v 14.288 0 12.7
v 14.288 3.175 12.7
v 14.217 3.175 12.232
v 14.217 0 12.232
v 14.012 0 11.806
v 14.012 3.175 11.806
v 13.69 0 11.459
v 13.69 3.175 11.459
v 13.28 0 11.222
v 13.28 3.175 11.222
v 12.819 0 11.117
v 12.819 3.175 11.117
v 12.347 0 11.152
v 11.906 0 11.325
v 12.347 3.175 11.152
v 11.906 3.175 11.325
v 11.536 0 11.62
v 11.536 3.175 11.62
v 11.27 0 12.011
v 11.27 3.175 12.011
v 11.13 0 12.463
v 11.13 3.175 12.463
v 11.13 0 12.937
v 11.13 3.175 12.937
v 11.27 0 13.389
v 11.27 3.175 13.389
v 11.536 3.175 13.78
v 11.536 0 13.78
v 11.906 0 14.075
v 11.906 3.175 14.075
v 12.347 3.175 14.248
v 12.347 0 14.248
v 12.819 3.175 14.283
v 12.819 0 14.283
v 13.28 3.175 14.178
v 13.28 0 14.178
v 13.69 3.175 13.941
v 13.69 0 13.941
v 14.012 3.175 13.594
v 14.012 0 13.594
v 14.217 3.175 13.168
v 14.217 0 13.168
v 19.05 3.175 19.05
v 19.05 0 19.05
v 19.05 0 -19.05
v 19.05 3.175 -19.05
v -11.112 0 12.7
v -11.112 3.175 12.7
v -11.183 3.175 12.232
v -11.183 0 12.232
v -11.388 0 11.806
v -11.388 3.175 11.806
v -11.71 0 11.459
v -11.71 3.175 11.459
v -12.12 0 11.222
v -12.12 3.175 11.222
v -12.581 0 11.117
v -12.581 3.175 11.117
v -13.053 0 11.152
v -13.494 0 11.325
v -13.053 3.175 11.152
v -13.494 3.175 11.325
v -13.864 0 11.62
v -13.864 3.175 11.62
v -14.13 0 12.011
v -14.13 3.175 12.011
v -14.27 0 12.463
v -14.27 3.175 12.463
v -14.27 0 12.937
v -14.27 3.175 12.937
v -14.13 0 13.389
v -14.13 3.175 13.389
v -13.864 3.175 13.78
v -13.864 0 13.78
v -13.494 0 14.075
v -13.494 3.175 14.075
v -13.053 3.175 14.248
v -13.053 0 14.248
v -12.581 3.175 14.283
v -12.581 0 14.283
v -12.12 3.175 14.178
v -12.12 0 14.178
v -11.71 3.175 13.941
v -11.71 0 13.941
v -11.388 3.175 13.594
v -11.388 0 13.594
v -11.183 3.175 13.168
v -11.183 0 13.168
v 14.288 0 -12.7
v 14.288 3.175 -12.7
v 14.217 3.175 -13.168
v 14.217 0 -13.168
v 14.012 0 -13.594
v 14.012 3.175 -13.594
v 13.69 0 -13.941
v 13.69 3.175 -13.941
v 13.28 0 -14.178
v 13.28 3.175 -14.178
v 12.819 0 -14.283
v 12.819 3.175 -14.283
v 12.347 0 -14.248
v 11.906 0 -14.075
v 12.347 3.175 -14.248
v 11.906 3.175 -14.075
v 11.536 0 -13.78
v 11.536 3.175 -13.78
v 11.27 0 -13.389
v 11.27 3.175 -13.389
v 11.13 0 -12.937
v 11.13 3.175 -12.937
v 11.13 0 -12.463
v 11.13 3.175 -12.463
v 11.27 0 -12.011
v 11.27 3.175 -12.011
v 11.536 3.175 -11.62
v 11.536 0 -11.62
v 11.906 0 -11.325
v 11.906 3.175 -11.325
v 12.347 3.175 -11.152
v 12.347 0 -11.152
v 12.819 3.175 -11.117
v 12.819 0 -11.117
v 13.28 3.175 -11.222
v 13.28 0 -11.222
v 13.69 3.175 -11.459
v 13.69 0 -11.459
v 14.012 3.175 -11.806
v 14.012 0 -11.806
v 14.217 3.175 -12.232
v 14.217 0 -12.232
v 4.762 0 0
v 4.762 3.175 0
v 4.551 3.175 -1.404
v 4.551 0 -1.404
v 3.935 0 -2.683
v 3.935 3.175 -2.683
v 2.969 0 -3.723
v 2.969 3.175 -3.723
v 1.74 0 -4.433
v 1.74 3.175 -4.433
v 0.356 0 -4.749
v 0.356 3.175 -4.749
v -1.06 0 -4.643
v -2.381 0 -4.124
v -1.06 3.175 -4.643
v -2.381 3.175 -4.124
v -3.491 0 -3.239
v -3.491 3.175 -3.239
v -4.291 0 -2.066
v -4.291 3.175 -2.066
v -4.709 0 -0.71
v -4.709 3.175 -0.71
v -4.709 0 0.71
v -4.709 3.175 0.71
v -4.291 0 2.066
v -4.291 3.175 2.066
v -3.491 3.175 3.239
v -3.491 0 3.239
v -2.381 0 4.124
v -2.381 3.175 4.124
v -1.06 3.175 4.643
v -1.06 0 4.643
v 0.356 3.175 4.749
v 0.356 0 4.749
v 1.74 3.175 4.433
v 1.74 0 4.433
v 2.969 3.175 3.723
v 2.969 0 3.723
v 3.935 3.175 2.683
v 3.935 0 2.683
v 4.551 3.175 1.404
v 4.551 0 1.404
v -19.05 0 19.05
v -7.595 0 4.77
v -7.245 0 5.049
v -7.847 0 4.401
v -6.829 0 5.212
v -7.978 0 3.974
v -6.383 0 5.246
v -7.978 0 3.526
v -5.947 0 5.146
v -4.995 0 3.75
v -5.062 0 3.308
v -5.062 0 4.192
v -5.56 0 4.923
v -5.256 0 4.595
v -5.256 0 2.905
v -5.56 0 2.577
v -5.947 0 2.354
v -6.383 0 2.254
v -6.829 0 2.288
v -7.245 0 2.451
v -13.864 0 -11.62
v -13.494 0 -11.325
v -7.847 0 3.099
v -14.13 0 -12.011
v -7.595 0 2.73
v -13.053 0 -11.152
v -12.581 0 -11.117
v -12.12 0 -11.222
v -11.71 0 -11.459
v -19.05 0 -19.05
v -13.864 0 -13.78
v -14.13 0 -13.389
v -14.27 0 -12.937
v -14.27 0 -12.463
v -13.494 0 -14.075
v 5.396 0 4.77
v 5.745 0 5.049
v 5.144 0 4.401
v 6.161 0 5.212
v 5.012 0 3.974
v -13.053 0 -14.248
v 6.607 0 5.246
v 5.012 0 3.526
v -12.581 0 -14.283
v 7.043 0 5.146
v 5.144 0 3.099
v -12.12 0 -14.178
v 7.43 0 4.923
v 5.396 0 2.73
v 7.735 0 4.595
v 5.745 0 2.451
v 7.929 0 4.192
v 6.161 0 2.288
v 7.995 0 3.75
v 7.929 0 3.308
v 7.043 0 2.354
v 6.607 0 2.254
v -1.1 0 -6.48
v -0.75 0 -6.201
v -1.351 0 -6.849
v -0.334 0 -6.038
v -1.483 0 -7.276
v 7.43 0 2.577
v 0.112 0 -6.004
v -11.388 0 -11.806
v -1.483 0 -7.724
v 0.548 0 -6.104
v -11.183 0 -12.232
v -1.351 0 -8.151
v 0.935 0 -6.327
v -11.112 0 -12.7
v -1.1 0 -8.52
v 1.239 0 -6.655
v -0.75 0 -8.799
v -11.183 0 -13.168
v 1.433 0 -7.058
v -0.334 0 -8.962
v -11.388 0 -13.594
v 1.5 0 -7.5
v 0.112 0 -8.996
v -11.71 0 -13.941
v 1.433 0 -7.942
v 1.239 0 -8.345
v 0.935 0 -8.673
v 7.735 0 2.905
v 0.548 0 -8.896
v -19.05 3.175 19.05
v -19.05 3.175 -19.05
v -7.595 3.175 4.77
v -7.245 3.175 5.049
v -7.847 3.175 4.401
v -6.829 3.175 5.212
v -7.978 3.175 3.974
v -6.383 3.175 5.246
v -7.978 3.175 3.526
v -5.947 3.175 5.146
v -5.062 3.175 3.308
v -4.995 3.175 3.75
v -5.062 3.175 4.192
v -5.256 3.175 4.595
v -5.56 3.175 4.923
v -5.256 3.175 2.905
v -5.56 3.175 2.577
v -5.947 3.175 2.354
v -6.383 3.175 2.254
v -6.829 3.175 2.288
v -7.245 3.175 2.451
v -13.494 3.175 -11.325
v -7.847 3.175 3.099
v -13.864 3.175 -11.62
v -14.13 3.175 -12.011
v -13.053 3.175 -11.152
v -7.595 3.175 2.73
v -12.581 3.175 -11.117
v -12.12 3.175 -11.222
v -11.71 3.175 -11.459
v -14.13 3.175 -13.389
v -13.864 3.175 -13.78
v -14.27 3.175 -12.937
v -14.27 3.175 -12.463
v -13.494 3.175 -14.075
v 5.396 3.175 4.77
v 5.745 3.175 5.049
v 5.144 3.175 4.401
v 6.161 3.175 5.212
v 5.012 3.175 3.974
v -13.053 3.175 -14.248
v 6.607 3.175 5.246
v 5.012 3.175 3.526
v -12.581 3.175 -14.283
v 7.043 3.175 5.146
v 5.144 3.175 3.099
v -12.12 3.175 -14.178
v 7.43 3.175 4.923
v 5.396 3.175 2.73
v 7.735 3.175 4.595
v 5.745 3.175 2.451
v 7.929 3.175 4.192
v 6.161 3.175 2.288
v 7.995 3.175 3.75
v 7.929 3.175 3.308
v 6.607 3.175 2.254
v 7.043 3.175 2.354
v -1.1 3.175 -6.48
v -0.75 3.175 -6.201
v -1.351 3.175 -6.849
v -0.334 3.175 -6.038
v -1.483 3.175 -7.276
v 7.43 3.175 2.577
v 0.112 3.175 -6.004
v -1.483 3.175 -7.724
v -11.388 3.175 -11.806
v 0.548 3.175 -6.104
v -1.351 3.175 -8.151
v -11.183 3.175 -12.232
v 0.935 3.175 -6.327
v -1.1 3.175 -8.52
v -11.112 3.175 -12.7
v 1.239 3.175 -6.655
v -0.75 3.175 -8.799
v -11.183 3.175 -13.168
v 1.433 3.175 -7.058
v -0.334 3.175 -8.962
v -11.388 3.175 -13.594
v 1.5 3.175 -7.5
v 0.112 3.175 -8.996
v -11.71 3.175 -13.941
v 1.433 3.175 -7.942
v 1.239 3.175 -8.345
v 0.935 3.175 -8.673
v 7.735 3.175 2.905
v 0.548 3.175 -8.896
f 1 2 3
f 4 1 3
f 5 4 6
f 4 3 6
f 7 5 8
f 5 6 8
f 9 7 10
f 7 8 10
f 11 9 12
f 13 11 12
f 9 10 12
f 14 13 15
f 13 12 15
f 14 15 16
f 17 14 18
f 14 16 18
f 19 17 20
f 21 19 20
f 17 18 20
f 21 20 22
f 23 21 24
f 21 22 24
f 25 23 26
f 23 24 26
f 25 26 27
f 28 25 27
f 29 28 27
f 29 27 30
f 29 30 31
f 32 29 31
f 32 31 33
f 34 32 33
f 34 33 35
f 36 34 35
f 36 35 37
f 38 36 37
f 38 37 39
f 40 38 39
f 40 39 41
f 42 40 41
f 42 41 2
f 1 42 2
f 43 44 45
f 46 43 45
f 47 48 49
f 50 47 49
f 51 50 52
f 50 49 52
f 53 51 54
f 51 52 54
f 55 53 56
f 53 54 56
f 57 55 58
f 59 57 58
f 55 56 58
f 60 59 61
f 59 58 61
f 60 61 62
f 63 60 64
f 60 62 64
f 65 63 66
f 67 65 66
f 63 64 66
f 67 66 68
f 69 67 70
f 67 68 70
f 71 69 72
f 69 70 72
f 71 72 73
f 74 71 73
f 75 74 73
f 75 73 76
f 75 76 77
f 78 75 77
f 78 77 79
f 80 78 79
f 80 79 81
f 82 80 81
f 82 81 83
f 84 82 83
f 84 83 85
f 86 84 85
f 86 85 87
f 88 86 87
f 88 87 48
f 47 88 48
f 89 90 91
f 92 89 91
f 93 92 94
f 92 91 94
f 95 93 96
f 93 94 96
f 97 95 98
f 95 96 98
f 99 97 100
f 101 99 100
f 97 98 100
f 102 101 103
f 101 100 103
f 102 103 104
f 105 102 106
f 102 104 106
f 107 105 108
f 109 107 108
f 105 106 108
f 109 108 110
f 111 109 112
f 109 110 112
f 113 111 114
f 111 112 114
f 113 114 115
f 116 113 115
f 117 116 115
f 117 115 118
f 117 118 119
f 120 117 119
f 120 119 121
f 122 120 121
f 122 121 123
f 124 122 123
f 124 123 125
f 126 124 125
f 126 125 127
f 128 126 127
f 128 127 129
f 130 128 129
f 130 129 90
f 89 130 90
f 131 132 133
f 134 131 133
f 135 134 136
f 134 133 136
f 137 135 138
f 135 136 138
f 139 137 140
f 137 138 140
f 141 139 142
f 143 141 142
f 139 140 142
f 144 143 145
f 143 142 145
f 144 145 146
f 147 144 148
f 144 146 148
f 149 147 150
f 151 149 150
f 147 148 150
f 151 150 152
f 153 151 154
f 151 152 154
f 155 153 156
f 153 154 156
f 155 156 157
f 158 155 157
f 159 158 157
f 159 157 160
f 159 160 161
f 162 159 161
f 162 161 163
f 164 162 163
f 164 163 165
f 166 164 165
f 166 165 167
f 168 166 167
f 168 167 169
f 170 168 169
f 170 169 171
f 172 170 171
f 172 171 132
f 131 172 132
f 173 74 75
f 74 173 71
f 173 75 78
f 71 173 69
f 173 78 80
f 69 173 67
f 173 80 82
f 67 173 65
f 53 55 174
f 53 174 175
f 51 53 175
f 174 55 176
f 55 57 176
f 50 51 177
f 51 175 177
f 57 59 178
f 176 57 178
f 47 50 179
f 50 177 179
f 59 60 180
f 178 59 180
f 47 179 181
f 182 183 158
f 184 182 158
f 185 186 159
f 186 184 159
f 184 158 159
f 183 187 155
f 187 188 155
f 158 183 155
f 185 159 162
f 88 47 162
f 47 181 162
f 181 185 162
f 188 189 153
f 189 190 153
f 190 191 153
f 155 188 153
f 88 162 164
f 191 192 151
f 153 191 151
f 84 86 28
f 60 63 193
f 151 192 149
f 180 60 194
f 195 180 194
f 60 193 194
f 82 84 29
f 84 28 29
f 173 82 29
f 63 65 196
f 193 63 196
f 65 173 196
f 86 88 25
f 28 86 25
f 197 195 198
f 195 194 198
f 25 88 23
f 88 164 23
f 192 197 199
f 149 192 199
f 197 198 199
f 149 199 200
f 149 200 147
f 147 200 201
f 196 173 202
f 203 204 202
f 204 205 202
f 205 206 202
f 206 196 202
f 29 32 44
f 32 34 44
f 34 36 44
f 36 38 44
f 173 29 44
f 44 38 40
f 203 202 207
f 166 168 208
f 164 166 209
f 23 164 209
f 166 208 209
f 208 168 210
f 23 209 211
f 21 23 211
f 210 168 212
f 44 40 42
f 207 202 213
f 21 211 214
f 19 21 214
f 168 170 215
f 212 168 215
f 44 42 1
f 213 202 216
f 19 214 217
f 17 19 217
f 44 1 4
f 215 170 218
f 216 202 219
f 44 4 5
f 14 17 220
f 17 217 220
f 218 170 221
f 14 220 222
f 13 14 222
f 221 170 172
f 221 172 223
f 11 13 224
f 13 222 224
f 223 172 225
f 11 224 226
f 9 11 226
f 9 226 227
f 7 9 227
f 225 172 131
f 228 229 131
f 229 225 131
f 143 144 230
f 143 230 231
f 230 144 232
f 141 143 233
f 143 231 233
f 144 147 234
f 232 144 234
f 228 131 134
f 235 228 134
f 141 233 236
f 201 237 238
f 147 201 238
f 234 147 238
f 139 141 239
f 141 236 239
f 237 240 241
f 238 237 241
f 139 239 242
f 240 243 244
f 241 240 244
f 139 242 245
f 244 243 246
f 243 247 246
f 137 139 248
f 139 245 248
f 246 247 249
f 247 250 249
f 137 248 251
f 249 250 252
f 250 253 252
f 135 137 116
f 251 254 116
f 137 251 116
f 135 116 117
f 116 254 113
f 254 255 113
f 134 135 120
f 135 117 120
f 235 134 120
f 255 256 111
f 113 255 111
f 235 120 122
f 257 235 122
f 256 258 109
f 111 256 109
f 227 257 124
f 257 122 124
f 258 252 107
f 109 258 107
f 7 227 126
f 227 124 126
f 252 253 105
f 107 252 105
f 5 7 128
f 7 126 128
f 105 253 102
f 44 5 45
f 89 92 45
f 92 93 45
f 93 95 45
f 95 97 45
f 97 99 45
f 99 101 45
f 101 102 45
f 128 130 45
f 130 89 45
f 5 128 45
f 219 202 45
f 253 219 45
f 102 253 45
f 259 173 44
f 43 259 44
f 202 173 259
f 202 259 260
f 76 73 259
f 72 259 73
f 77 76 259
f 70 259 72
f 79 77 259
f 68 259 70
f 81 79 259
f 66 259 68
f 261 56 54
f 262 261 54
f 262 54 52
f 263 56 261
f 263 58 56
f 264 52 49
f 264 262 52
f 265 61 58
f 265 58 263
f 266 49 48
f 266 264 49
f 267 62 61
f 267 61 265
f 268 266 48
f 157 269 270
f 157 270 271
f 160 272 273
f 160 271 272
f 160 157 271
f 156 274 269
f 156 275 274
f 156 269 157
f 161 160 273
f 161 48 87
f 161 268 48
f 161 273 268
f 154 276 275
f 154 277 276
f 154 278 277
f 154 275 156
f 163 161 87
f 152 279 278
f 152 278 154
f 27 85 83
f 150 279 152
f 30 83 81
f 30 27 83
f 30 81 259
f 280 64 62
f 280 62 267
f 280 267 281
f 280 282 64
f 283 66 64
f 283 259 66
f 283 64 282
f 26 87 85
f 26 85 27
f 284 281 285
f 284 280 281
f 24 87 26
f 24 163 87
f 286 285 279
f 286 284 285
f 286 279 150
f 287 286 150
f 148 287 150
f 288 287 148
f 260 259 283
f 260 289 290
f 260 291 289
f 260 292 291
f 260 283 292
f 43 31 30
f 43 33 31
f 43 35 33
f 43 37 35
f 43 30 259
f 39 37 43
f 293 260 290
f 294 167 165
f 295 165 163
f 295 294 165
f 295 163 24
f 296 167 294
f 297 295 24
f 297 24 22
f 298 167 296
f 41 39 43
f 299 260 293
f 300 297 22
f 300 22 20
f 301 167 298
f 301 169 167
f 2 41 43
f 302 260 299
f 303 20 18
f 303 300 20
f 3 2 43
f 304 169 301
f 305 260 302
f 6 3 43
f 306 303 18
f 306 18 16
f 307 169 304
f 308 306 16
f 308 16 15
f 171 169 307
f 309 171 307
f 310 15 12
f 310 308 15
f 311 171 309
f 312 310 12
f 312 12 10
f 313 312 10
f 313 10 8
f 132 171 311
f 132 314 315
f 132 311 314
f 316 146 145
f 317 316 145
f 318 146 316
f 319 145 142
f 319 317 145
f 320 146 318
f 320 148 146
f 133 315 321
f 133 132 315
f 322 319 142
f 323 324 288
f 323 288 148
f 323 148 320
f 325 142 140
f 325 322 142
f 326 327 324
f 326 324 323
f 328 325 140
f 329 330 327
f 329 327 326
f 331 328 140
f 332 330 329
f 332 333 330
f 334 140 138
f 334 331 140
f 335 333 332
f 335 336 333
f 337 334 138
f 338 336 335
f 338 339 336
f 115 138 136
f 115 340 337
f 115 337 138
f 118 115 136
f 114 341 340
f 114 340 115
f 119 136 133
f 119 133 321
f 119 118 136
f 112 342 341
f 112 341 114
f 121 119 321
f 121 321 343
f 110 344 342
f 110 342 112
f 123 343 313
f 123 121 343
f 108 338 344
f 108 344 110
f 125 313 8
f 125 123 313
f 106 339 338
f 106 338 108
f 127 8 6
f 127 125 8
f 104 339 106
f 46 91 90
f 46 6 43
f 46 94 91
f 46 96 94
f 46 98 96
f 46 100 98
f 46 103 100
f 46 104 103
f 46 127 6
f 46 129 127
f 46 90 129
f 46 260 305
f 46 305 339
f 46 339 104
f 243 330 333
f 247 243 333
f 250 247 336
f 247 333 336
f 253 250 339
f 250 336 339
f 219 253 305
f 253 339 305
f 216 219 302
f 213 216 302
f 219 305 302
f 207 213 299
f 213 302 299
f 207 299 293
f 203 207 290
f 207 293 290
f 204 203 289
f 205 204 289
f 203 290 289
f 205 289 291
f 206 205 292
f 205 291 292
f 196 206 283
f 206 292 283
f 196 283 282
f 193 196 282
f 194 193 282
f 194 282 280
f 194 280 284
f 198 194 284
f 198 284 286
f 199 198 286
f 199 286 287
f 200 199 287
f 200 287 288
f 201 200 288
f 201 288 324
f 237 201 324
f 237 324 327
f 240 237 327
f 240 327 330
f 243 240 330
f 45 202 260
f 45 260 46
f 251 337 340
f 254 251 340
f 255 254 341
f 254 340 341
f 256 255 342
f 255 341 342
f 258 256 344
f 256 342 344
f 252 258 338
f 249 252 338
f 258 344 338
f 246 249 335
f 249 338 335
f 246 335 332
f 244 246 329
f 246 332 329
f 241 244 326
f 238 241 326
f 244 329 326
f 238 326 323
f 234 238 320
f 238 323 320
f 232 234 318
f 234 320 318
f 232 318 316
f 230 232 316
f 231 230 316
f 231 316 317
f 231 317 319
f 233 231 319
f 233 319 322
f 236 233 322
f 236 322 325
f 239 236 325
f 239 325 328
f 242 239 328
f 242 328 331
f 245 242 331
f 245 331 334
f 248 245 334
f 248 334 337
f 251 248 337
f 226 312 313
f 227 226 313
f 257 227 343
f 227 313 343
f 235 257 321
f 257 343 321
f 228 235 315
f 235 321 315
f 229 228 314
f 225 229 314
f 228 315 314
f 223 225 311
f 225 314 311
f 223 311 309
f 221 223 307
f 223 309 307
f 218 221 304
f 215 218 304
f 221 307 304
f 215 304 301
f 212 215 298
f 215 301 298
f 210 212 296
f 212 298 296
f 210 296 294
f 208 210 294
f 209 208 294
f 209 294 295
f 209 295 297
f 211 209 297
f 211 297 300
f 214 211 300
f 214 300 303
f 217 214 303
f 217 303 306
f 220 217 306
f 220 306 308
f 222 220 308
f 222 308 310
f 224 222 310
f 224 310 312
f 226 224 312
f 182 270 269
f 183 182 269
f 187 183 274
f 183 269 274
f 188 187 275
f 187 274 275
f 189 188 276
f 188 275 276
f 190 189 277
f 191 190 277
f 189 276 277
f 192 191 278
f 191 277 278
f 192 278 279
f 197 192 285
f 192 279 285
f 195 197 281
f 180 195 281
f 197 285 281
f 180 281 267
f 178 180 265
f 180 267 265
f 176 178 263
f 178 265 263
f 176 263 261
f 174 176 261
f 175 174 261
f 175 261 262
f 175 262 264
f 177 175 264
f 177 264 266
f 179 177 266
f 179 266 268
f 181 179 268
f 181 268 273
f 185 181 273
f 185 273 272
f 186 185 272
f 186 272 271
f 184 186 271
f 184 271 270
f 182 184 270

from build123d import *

# Parameters (mm, degrees)
SKETCH1_W           = 38.1
SKETCH1_H           = 38.1
BOSS_EXTRUDE1_DEPTH = 3.175
SKETCH2_R           = 1.5
SKETCH2_R_2         = 4.7625
CUT_EXTRUDE1_DEPTH  = 4.175
SKETCH3_R           = 1.5875
CUT_EXTRUDE2_DEPTH  = 4.175


with BuildPart() as part:
    # Sketch1 → Boss-Extrude1 (new body)
    with BuildSketch(Plane(origin=(0, 0, 0), x_dir=(1, 0, 0), z_dir=(0, 1, 0))):
        Rectangle(SKETCH1_W, SKETCH1_H)
    extrude(amount=BOSS_EXTRUDE1_DEPTH)

    # Sketch2 → Cut-Extrude1 (cut, through all)
    with BuildSketch(Plane(origin=(0, 3.175, 0), x_dir=(1, 0, 0), z_dir=(0, 1, 0))):
        with Locations((0, 7.5)):
            Circle(SKETCH2_R)
        with Locations((6.495190528, -3.75)):
            Circle(SKETCH2_R)
        with Locations((-6.495190528, -3.75)):
            Circle(SKETCH2_R)
        Circle(SKETCH2_R_2)
    extrude(amount=-CUT_EXTRUDE1_DEPTH, mode=Mode.SUBTRACT)

    # Sketch3 → Cut-Extrude2 (cut, through all)
    with BuildSketch(Plane(origin=(0, 3.175, 0), x_dir=(1, 0, 0), z_dir=(0, 1, 0))):
        with Locations((-12.7, 12.7)):
            Circle(SKETCH3_R)
        with Locations((-12.7, -12.7)):
            Circle(SKETCH3_R)
        with Locations((12.7, -12.7)):
            Circle(SKETCH3_R)
        with Locations((12.7, 12.7)):
            Circle(SKETCH3_R)
    extrude(amount=-CUT_EXTRUDE2_DEPTH, mode=Mode.SUBTRACT)


solid = part.part
